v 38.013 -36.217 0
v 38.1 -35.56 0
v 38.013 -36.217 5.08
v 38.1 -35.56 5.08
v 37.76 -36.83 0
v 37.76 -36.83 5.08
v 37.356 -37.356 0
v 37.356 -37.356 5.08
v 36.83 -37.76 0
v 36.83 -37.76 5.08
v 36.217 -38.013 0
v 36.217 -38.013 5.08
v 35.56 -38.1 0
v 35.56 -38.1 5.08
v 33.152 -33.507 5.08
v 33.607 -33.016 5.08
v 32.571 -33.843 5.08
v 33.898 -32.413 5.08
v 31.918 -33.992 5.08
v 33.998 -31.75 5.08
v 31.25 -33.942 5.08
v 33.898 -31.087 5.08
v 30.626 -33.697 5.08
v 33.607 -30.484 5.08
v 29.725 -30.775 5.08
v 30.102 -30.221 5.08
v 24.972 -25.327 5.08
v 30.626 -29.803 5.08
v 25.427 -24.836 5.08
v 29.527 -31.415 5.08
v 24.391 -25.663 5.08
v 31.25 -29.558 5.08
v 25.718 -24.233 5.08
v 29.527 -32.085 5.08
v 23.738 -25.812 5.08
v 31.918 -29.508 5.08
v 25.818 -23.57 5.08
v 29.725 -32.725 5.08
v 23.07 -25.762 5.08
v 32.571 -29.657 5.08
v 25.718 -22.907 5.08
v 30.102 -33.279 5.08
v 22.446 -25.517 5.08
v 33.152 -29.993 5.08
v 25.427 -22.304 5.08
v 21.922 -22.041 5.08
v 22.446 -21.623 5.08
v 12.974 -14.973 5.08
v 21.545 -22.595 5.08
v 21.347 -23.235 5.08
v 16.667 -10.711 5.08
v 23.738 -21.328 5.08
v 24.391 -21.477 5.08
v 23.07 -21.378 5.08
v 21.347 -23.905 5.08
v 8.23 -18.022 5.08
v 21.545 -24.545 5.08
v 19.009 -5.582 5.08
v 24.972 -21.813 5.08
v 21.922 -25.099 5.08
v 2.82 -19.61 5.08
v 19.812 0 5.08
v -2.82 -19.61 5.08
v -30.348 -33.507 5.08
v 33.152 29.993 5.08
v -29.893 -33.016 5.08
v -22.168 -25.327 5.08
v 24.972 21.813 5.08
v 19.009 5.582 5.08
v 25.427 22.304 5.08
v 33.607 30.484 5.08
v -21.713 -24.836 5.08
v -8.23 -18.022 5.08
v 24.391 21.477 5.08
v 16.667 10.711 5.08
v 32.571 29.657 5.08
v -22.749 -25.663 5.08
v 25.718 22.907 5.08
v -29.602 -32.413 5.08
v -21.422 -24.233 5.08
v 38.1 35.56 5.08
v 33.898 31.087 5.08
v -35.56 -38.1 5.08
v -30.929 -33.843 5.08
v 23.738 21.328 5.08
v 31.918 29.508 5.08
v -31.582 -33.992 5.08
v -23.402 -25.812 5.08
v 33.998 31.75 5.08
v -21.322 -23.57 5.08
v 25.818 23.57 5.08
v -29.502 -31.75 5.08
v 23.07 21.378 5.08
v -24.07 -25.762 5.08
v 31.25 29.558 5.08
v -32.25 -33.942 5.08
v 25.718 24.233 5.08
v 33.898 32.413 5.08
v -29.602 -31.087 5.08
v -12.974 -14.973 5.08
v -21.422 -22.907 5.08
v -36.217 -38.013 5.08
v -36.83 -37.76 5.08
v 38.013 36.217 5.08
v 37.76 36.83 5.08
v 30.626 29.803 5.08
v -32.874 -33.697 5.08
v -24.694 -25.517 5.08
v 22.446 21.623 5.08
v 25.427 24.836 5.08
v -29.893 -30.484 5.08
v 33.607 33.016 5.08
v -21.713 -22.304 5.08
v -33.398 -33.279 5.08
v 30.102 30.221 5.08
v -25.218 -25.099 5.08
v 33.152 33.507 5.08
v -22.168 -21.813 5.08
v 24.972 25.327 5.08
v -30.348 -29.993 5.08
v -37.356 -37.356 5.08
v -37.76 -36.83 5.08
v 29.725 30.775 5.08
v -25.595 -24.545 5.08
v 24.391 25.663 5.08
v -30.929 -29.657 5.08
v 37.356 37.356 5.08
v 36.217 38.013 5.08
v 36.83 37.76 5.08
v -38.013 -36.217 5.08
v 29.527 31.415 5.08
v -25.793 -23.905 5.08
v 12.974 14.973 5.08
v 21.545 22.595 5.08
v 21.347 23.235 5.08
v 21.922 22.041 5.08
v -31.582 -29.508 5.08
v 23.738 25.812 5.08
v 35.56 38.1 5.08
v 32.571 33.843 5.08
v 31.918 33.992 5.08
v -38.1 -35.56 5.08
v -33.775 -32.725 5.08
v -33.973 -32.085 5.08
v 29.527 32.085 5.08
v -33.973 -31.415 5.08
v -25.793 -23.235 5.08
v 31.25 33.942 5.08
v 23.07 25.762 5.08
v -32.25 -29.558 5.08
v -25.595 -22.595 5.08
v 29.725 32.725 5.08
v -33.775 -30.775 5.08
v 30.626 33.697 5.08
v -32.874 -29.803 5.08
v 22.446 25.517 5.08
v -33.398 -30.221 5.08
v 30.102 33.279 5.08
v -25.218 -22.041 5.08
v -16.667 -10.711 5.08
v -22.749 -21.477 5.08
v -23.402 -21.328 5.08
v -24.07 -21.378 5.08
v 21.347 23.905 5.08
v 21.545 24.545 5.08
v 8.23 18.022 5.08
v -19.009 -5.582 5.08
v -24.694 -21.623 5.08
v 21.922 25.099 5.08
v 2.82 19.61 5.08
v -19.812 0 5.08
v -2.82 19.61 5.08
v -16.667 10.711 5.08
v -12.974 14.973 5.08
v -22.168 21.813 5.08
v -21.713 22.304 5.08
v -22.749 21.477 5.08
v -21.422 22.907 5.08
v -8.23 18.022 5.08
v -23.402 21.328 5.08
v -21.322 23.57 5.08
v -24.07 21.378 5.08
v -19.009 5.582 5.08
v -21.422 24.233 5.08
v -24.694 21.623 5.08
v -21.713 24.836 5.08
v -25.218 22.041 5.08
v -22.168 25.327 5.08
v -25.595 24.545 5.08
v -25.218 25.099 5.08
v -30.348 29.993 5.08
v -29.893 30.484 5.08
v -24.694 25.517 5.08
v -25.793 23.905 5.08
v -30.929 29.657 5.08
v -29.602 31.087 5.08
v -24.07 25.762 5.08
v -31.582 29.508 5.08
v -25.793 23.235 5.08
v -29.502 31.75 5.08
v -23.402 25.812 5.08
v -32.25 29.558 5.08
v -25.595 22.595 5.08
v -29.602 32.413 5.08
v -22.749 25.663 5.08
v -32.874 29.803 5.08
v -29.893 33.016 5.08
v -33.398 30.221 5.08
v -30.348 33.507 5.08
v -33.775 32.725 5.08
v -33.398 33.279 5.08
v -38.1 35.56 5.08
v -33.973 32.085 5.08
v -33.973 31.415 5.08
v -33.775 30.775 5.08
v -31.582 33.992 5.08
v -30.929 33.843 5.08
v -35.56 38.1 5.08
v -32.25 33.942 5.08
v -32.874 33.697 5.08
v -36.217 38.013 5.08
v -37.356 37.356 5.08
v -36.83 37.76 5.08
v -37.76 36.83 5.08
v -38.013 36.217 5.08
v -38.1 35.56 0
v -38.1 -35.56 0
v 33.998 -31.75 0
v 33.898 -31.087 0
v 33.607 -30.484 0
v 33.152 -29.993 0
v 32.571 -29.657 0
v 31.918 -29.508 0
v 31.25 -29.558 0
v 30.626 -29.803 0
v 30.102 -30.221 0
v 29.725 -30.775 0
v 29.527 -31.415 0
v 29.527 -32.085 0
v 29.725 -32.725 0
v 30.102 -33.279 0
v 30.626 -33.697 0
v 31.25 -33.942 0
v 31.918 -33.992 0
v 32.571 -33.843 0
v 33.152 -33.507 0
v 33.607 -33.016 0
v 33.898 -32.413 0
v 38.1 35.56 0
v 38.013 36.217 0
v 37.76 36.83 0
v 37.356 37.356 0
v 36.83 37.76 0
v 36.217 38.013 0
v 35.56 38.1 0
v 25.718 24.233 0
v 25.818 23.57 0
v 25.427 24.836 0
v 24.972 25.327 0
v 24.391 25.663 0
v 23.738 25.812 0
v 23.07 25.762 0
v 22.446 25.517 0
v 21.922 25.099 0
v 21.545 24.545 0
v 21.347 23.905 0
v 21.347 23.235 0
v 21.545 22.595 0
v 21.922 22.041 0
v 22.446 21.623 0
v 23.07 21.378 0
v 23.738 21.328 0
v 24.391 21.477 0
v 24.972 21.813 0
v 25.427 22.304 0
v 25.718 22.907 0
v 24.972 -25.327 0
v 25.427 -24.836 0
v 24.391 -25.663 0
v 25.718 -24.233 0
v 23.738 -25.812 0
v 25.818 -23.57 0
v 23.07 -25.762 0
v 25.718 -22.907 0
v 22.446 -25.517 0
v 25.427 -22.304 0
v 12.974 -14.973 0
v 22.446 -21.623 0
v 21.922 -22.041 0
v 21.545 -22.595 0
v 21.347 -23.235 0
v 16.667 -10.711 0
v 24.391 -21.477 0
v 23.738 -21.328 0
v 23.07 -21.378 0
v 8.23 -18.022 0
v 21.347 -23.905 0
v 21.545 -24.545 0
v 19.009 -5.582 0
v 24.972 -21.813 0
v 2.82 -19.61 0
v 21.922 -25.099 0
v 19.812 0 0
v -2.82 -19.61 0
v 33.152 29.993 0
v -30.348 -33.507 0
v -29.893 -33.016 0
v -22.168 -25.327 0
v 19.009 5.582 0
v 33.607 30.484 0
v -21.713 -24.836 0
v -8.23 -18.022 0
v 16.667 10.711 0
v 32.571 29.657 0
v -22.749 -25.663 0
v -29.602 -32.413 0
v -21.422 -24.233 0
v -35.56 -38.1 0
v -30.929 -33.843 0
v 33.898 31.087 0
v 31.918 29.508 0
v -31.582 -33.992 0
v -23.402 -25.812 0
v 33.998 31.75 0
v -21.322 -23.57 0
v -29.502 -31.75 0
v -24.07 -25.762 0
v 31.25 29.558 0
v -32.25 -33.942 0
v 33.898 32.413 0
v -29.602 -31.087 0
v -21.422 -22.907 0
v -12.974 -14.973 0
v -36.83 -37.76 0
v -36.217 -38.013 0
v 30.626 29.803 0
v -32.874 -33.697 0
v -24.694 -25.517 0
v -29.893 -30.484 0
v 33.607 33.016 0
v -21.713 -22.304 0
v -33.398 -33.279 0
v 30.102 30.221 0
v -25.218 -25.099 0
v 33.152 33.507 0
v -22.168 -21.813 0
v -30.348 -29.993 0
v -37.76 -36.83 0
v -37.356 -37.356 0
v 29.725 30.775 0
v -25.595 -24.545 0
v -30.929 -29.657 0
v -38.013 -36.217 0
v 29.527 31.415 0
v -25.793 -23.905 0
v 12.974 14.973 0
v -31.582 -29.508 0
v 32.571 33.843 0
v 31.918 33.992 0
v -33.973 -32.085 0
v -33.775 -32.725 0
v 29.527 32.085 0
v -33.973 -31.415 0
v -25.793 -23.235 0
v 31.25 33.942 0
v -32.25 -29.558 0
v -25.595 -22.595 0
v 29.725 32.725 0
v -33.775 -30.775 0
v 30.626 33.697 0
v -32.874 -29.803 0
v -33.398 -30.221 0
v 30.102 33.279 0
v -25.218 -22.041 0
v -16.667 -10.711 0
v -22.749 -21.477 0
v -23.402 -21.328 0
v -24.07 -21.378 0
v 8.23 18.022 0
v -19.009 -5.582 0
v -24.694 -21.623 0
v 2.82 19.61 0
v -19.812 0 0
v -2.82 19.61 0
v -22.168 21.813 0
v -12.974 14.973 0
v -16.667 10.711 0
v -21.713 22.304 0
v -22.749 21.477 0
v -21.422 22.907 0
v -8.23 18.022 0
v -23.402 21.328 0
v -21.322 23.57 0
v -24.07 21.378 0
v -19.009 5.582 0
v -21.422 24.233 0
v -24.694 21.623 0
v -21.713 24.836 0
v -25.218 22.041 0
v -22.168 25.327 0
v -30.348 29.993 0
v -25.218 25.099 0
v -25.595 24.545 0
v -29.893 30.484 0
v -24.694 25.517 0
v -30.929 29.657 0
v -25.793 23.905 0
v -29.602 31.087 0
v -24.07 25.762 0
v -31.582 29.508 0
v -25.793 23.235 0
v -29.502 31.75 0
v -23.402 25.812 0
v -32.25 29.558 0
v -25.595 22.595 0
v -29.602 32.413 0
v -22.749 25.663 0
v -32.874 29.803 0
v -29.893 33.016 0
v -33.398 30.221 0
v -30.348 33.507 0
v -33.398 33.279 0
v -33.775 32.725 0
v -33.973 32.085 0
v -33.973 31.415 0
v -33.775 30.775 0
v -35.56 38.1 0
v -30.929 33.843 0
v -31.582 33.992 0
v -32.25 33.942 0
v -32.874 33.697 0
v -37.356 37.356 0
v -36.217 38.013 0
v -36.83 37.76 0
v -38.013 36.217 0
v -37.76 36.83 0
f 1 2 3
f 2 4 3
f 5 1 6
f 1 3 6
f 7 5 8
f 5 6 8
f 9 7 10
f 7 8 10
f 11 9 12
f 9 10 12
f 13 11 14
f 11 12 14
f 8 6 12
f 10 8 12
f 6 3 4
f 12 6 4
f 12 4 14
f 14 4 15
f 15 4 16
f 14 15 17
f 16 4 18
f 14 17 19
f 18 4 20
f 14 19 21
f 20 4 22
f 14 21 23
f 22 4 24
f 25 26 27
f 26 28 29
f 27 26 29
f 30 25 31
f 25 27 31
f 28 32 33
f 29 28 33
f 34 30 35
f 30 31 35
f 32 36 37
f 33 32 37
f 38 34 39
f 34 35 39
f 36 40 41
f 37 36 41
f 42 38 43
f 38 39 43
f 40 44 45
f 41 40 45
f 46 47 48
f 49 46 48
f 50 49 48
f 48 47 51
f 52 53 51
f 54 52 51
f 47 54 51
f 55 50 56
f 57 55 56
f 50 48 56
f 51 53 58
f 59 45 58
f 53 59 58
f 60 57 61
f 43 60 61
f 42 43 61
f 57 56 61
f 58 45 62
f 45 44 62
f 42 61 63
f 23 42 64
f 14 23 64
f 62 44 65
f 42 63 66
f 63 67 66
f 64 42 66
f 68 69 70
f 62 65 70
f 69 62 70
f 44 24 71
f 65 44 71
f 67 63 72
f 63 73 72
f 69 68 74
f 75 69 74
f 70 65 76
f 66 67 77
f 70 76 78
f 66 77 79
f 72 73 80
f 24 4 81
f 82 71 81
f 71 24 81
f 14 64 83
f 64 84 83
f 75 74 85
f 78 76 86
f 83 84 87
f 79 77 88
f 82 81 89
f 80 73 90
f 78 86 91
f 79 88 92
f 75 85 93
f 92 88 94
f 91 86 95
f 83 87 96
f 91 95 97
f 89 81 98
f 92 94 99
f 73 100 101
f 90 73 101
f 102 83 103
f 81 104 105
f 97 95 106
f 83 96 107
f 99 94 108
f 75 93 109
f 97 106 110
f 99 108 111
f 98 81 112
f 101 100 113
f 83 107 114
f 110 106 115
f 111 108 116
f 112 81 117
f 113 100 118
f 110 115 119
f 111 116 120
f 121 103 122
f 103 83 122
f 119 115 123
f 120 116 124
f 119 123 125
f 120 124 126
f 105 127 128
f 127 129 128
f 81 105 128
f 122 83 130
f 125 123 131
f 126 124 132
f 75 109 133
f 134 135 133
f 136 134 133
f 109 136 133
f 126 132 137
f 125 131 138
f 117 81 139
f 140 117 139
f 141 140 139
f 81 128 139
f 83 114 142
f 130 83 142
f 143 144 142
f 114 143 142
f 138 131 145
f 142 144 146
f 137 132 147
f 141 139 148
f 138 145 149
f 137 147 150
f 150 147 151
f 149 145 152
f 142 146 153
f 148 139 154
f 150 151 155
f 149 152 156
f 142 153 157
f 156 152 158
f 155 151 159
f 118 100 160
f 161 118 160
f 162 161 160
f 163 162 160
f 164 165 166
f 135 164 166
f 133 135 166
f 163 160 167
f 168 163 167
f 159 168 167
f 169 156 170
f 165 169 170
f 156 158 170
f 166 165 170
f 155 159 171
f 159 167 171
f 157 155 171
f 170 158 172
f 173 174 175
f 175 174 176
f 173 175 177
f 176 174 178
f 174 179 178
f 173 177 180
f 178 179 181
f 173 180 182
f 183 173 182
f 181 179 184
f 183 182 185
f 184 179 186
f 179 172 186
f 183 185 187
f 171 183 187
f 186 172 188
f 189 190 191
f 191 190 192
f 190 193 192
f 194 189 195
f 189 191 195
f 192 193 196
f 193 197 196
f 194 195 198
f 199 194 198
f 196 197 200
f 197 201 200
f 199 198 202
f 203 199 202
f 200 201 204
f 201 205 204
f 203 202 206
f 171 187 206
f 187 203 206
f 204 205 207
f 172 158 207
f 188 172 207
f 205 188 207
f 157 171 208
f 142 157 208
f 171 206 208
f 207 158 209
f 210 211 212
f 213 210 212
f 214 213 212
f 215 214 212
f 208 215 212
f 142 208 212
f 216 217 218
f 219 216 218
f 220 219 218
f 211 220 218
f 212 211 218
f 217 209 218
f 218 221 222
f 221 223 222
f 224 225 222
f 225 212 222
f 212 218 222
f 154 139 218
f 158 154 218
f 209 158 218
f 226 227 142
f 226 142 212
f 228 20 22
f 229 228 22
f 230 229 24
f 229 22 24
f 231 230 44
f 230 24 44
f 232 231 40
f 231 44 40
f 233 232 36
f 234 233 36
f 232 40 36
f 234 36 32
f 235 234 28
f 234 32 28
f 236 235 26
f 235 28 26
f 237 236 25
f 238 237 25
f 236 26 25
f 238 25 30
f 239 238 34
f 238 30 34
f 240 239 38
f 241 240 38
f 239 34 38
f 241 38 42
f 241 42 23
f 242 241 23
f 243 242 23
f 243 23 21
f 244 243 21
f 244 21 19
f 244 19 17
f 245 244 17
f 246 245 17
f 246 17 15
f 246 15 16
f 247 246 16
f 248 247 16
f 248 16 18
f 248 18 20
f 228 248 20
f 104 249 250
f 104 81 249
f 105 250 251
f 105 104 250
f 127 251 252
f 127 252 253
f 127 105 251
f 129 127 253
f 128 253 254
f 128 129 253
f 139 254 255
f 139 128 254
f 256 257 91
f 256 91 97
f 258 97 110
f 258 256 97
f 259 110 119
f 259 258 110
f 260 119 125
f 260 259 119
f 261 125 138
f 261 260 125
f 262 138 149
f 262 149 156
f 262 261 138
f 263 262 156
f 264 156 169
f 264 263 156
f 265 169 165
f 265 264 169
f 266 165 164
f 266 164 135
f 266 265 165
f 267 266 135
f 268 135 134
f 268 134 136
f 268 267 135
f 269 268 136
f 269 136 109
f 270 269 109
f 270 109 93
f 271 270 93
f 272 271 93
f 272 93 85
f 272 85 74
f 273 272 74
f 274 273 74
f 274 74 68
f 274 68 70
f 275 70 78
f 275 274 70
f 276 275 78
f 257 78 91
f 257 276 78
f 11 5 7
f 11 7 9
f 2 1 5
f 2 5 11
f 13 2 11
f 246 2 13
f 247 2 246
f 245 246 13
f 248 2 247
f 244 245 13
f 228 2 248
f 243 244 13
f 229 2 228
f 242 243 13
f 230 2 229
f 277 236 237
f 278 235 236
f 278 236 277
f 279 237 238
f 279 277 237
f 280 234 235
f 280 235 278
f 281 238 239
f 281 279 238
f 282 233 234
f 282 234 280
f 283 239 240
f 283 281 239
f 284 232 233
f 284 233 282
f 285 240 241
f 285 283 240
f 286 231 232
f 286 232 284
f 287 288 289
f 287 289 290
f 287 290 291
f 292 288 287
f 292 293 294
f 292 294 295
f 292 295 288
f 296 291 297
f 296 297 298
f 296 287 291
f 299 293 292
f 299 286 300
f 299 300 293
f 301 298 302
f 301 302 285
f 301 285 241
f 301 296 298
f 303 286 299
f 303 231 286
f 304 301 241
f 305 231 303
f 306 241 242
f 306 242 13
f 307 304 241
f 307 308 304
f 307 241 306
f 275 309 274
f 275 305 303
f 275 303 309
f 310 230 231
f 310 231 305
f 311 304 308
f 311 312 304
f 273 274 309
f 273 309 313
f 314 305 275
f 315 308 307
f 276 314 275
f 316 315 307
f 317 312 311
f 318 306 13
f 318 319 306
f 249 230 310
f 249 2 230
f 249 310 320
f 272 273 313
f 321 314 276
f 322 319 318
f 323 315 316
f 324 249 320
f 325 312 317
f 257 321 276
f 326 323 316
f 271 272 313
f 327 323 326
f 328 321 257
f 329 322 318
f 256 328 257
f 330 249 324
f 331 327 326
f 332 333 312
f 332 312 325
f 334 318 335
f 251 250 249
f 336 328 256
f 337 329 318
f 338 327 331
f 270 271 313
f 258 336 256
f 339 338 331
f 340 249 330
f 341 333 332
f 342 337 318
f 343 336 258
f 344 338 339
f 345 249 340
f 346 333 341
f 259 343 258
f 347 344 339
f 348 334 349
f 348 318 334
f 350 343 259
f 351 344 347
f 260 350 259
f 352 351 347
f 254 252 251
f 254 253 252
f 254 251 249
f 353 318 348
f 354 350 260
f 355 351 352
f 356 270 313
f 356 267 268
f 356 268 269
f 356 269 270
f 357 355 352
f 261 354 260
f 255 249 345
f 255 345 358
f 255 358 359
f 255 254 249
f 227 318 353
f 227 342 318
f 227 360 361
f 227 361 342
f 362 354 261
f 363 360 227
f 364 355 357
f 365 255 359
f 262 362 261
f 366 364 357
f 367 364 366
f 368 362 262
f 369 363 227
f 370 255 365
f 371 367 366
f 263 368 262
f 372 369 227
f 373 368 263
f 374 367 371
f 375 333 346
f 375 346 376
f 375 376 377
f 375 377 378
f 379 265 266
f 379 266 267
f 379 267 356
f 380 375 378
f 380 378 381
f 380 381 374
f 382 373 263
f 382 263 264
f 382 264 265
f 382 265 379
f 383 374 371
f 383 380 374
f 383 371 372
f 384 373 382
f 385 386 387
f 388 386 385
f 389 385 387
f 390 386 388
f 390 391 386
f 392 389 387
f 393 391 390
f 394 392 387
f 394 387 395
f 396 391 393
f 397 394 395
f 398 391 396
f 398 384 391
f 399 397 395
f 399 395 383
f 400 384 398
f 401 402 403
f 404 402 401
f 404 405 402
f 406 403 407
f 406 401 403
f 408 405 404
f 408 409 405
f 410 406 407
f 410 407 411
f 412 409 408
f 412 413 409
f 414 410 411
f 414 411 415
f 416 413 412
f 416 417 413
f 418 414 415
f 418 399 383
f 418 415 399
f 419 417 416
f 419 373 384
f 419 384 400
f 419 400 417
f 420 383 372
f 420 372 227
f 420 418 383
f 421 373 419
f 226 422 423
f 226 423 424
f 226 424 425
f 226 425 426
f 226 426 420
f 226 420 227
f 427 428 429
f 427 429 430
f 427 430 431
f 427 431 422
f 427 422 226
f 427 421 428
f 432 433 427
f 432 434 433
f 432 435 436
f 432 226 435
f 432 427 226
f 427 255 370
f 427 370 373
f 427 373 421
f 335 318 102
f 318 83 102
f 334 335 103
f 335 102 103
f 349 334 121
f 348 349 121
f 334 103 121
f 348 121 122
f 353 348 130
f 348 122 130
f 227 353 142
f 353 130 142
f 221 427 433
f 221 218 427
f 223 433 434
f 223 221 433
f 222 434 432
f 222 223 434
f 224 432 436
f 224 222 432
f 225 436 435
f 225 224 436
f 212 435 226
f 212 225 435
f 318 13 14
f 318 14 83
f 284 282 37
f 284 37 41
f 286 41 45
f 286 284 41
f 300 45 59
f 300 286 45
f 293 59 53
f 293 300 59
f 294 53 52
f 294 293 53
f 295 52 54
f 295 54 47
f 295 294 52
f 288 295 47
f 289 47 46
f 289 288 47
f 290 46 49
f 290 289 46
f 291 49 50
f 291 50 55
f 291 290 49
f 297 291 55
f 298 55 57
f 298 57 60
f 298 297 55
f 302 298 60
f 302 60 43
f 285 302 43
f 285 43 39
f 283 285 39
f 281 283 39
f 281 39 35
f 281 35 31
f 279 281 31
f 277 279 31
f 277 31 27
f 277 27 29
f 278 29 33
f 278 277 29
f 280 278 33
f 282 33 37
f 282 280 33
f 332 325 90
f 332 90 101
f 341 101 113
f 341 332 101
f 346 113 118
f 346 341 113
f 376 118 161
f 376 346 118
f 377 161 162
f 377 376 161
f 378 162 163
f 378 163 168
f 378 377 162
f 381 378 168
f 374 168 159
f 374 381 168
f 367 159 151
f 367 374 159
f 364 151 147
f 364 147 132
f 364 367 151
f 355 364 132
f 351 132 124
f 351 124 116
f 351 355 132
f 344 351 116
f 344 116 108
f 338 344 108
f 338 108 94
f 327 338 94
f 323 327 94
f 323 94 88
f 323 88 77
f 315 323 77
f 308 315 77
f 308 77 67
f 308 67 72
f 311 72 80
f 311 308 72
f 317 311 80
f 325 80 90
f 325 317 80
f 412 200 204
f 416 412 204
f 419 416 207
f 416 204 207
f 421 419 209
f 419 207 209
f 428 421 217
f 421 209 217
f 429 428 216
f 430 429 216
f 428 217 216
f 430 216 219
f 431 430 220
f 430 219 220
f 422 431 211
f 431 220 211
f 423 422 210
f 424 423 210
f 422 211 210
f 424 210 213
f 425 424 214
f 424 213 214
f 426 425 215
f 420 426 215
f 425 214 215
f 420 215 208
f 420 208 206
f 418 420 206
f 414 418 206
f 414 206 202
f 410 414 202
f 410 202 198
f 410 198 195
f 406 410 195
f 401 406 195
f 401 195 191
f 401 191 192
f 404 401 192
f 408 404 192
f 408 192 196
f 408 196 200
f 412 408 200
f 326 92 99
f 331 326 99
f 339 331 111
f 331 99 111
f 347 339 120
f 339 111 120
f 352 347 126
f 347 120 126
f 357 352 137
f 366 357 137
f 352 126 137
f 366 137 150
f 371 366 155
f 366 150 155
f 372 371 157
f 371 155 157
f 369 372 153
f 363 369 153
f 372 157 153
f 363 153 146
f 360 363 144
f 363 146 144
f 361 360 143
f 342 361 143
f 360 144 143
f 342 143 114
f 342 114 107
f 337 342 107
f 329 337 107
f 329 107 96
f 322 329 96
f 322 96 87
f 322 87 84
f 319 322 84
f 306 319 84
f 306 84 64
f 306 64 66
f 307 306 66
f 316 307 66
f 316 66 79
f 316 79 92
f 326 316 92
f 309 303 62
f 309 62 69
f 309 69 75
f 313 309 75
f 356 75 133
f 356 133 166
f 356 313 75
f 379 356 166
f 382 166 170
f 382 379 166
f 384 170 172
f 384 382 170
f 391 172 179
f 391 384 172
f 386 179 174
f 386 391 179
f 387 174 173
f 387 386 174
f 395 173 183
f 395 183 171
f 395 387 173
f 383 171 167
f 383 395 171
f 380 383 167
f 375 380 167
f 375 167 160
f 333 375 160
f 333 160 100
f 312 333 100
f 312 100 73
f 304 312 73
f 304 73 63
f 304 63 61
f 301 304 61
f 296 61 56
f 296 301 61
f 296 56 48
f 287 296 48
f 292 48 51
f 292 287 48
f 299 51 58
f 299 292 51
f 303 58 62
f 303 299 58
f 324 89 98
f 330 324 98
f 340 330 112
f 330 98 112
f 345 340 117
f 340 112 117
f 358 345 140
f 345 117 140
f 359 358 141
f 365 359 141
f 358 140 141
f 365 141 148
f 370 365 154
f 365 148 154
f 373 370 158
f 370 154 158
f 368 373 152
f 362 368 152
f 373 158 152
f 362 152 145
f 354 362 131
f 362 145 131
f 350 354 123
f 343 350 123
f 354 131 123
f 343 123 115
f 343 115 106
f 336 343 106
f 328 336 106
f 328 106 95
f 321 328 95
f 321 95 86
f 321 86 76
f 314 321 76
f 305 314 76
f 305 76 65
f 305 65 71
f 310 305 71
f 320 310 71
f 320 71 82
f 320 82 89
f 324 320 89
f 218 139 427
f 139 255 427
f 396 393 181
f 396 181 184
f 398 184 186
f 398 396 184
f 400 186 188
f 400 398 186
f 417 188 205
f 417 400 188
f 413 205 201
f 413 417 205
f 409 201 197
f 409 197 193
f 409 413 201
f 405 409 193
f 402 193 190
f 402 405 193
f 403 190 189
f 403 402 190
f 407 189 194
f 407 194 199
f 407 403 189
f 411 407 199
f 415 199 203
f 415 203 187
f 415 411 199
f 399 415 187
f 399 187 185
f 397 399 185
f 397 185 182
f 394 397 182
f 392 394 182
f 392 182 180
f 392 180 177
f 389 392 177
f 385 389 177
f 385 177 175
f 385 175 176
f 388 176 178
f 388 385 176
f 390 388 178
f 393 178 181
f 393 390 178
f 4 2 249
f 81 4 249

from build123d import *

# Parameters (mm, degrees)
SKETCH1_W             = 61.48
SKETCH1_H             = 61.48
SKETCH1_R             = 2.2479
SKETCH1_R_2           = 19.812
BOSS_EXTRUDE1_DEPTH   = 5.08
FILLET1_R             = 2.54
BOSS_EXTRUDE2_DEPTH   = 5.08
SKETCH8_W             = 76.2
SKETCH8_H             = 76.2
SKETCH8_W_2           = 61.48
SKETCH8_H_2           = 61.48
BOSS_EXTRUDE3_DEPTH   = 5.08
F_8_CLEARANCE_HOLE1_D = 4.4958
FILLET2_R             = 2.54


with BuildPart() as part:
    # Sketch1 → Boss-Extrude1 (new body)
    with BuildSketch(Plane.XY):
        Rectangle(SKETCH1_W, SKETCH1_H)
        with Locations((-23.57, 23.57)):
            Circle(SKETCH1_R, mode=Mode.SUBTRACT)
        with Locations((-23.57, -23.57)):
            Circle(SKETCH1_R, mode=Mode.SUBTRACT)
        with Locations((23.57, -23.57)):
            Circle(SKETCH1_R, mode=Mode.SUBTRACT)
        Circle(SKETCH1_R_2, mode=Mode.SUBTRACT)
        with Locations((23.57, 23.57)):
            Circle(SKETCH1_R, mode=Mode.SUBTRACT)
    extrude(amount=BOSS_EXTRUDE1_DEPTH)

    # Fillet1
    fillet1_edges = [part.edges().sort_by_distance(p)[0] for p in [
        (-30.74, 30.74, 2.54),
        (30.74, 30.74, 2.54),
        (30.74, -30.74, 2.54),
        (-30.74, -30.74, 2.54),
    ]]
    fillet(fillet1_edges, radius=FILLET1_R)

    # Sketch7 → Boss-Extrude2 (add, through all)
    with BuildSketch(Plane(origin=(0, 0, 0), x_dir=(-1, 0, 0), z_dir=(0, 0, -1))):
        with BuildLine():
            Line((-27.259871939, 36.240128061), (-21.759743879, 30.74))
            Line((-21.759743879, 30.74), (-30.74, 21.759743879))
            Line((-30.74, 21.759743879), (-36.240128061, 27.259871939))
            ThreePointArc((-36.240128061, 27.259871939), (-36.240128061, 36.240128061), (-27.259871939, 36.240128061))
        make_face()
        with BuildLine():
            Line((30.74, 21.759743879), (36.240128061, 27.259871939))
            ThreePointArc((36.240128061, 27.259871939), (36.240128061, 36.240128061), (27.259871939, 36.240128061))
            Line((27.259871939, 36.240128061), (21.759743879, 30.74))
            Line((21.759743879, 30.74), (30.74, 21.759743879))
        make_face()
        with BuildLine():
            Line((27.259871939, -36.240128061), (21.759743879, -30.74))
            Line((21.759743879, -30.74), (30.74, -21.759743879))
            Line((30.74, -21.759743879), (36.240128061, -27.259871939))
            ThreePointArc((36.240128061, -27.259871939), (36.240128061, -36.240128061), (27.259871939, -36.240128061))
        make_face()
        with BuildLine():
            Line((-30.74, -21.759743879), (-36.240128061, -27.259871939))
            ThreePointArc((-36.240128061, -27.259871939), (-36.240128061, -36.240128061), (-27.259871939, -36.240128061))
            Line((-27.259871939, -36.240128061), (-21.759743879, -30.74))
            Line((-21.759743879, -30.74), (-30.74, -21.759743879))
        make_face()
    extrude(amount=-BOSS_EXTRUDE2_DEPTH)

    # Sketch8 → Boss-Extrude3 (add, through all)
    with BuildSketch(Plane(origin=(0, 0, 0), x_dir=(-1, 0, 0), z_dir=(0, 0, -1))):
        Rectangle(SKETCH8_W, SKETCH8_H)
        Rectangle(SKETCH8_W_2, SKETCH8_H_2, mode=Mode.SUBTRACT)
    extrude(amount=-BOSS_EXTRUDE3_DEPTH)

    # #8 Clearance Hole1 (through all)
    with Locations(Plane(origin=(0, 0, 0), x_dir=(-1, 0, 0), z_dir=(0, 0, -1))):
        with Locations((31.75, 31.75), (0, 0), (31.75, -31.75), (-31.75, -31.75), (-31.75, 31.75)):
            Hole(F_8_CLEARANCE_HOLE1_D / 2)

    # Fillet2
    fillet2_edges = [part.edges().sort_by_distance(p)[0] for p in [
        (-38.1, 38.1, 2.54),
        (-38.1, -38.1, 2.54),
        (38.1, -38.1, 2.54),
        (38.1, 38.1, 2.54),
    ]]
    fillet(fillet2_edges, radius=FILLET2_R)


solid = part.part
